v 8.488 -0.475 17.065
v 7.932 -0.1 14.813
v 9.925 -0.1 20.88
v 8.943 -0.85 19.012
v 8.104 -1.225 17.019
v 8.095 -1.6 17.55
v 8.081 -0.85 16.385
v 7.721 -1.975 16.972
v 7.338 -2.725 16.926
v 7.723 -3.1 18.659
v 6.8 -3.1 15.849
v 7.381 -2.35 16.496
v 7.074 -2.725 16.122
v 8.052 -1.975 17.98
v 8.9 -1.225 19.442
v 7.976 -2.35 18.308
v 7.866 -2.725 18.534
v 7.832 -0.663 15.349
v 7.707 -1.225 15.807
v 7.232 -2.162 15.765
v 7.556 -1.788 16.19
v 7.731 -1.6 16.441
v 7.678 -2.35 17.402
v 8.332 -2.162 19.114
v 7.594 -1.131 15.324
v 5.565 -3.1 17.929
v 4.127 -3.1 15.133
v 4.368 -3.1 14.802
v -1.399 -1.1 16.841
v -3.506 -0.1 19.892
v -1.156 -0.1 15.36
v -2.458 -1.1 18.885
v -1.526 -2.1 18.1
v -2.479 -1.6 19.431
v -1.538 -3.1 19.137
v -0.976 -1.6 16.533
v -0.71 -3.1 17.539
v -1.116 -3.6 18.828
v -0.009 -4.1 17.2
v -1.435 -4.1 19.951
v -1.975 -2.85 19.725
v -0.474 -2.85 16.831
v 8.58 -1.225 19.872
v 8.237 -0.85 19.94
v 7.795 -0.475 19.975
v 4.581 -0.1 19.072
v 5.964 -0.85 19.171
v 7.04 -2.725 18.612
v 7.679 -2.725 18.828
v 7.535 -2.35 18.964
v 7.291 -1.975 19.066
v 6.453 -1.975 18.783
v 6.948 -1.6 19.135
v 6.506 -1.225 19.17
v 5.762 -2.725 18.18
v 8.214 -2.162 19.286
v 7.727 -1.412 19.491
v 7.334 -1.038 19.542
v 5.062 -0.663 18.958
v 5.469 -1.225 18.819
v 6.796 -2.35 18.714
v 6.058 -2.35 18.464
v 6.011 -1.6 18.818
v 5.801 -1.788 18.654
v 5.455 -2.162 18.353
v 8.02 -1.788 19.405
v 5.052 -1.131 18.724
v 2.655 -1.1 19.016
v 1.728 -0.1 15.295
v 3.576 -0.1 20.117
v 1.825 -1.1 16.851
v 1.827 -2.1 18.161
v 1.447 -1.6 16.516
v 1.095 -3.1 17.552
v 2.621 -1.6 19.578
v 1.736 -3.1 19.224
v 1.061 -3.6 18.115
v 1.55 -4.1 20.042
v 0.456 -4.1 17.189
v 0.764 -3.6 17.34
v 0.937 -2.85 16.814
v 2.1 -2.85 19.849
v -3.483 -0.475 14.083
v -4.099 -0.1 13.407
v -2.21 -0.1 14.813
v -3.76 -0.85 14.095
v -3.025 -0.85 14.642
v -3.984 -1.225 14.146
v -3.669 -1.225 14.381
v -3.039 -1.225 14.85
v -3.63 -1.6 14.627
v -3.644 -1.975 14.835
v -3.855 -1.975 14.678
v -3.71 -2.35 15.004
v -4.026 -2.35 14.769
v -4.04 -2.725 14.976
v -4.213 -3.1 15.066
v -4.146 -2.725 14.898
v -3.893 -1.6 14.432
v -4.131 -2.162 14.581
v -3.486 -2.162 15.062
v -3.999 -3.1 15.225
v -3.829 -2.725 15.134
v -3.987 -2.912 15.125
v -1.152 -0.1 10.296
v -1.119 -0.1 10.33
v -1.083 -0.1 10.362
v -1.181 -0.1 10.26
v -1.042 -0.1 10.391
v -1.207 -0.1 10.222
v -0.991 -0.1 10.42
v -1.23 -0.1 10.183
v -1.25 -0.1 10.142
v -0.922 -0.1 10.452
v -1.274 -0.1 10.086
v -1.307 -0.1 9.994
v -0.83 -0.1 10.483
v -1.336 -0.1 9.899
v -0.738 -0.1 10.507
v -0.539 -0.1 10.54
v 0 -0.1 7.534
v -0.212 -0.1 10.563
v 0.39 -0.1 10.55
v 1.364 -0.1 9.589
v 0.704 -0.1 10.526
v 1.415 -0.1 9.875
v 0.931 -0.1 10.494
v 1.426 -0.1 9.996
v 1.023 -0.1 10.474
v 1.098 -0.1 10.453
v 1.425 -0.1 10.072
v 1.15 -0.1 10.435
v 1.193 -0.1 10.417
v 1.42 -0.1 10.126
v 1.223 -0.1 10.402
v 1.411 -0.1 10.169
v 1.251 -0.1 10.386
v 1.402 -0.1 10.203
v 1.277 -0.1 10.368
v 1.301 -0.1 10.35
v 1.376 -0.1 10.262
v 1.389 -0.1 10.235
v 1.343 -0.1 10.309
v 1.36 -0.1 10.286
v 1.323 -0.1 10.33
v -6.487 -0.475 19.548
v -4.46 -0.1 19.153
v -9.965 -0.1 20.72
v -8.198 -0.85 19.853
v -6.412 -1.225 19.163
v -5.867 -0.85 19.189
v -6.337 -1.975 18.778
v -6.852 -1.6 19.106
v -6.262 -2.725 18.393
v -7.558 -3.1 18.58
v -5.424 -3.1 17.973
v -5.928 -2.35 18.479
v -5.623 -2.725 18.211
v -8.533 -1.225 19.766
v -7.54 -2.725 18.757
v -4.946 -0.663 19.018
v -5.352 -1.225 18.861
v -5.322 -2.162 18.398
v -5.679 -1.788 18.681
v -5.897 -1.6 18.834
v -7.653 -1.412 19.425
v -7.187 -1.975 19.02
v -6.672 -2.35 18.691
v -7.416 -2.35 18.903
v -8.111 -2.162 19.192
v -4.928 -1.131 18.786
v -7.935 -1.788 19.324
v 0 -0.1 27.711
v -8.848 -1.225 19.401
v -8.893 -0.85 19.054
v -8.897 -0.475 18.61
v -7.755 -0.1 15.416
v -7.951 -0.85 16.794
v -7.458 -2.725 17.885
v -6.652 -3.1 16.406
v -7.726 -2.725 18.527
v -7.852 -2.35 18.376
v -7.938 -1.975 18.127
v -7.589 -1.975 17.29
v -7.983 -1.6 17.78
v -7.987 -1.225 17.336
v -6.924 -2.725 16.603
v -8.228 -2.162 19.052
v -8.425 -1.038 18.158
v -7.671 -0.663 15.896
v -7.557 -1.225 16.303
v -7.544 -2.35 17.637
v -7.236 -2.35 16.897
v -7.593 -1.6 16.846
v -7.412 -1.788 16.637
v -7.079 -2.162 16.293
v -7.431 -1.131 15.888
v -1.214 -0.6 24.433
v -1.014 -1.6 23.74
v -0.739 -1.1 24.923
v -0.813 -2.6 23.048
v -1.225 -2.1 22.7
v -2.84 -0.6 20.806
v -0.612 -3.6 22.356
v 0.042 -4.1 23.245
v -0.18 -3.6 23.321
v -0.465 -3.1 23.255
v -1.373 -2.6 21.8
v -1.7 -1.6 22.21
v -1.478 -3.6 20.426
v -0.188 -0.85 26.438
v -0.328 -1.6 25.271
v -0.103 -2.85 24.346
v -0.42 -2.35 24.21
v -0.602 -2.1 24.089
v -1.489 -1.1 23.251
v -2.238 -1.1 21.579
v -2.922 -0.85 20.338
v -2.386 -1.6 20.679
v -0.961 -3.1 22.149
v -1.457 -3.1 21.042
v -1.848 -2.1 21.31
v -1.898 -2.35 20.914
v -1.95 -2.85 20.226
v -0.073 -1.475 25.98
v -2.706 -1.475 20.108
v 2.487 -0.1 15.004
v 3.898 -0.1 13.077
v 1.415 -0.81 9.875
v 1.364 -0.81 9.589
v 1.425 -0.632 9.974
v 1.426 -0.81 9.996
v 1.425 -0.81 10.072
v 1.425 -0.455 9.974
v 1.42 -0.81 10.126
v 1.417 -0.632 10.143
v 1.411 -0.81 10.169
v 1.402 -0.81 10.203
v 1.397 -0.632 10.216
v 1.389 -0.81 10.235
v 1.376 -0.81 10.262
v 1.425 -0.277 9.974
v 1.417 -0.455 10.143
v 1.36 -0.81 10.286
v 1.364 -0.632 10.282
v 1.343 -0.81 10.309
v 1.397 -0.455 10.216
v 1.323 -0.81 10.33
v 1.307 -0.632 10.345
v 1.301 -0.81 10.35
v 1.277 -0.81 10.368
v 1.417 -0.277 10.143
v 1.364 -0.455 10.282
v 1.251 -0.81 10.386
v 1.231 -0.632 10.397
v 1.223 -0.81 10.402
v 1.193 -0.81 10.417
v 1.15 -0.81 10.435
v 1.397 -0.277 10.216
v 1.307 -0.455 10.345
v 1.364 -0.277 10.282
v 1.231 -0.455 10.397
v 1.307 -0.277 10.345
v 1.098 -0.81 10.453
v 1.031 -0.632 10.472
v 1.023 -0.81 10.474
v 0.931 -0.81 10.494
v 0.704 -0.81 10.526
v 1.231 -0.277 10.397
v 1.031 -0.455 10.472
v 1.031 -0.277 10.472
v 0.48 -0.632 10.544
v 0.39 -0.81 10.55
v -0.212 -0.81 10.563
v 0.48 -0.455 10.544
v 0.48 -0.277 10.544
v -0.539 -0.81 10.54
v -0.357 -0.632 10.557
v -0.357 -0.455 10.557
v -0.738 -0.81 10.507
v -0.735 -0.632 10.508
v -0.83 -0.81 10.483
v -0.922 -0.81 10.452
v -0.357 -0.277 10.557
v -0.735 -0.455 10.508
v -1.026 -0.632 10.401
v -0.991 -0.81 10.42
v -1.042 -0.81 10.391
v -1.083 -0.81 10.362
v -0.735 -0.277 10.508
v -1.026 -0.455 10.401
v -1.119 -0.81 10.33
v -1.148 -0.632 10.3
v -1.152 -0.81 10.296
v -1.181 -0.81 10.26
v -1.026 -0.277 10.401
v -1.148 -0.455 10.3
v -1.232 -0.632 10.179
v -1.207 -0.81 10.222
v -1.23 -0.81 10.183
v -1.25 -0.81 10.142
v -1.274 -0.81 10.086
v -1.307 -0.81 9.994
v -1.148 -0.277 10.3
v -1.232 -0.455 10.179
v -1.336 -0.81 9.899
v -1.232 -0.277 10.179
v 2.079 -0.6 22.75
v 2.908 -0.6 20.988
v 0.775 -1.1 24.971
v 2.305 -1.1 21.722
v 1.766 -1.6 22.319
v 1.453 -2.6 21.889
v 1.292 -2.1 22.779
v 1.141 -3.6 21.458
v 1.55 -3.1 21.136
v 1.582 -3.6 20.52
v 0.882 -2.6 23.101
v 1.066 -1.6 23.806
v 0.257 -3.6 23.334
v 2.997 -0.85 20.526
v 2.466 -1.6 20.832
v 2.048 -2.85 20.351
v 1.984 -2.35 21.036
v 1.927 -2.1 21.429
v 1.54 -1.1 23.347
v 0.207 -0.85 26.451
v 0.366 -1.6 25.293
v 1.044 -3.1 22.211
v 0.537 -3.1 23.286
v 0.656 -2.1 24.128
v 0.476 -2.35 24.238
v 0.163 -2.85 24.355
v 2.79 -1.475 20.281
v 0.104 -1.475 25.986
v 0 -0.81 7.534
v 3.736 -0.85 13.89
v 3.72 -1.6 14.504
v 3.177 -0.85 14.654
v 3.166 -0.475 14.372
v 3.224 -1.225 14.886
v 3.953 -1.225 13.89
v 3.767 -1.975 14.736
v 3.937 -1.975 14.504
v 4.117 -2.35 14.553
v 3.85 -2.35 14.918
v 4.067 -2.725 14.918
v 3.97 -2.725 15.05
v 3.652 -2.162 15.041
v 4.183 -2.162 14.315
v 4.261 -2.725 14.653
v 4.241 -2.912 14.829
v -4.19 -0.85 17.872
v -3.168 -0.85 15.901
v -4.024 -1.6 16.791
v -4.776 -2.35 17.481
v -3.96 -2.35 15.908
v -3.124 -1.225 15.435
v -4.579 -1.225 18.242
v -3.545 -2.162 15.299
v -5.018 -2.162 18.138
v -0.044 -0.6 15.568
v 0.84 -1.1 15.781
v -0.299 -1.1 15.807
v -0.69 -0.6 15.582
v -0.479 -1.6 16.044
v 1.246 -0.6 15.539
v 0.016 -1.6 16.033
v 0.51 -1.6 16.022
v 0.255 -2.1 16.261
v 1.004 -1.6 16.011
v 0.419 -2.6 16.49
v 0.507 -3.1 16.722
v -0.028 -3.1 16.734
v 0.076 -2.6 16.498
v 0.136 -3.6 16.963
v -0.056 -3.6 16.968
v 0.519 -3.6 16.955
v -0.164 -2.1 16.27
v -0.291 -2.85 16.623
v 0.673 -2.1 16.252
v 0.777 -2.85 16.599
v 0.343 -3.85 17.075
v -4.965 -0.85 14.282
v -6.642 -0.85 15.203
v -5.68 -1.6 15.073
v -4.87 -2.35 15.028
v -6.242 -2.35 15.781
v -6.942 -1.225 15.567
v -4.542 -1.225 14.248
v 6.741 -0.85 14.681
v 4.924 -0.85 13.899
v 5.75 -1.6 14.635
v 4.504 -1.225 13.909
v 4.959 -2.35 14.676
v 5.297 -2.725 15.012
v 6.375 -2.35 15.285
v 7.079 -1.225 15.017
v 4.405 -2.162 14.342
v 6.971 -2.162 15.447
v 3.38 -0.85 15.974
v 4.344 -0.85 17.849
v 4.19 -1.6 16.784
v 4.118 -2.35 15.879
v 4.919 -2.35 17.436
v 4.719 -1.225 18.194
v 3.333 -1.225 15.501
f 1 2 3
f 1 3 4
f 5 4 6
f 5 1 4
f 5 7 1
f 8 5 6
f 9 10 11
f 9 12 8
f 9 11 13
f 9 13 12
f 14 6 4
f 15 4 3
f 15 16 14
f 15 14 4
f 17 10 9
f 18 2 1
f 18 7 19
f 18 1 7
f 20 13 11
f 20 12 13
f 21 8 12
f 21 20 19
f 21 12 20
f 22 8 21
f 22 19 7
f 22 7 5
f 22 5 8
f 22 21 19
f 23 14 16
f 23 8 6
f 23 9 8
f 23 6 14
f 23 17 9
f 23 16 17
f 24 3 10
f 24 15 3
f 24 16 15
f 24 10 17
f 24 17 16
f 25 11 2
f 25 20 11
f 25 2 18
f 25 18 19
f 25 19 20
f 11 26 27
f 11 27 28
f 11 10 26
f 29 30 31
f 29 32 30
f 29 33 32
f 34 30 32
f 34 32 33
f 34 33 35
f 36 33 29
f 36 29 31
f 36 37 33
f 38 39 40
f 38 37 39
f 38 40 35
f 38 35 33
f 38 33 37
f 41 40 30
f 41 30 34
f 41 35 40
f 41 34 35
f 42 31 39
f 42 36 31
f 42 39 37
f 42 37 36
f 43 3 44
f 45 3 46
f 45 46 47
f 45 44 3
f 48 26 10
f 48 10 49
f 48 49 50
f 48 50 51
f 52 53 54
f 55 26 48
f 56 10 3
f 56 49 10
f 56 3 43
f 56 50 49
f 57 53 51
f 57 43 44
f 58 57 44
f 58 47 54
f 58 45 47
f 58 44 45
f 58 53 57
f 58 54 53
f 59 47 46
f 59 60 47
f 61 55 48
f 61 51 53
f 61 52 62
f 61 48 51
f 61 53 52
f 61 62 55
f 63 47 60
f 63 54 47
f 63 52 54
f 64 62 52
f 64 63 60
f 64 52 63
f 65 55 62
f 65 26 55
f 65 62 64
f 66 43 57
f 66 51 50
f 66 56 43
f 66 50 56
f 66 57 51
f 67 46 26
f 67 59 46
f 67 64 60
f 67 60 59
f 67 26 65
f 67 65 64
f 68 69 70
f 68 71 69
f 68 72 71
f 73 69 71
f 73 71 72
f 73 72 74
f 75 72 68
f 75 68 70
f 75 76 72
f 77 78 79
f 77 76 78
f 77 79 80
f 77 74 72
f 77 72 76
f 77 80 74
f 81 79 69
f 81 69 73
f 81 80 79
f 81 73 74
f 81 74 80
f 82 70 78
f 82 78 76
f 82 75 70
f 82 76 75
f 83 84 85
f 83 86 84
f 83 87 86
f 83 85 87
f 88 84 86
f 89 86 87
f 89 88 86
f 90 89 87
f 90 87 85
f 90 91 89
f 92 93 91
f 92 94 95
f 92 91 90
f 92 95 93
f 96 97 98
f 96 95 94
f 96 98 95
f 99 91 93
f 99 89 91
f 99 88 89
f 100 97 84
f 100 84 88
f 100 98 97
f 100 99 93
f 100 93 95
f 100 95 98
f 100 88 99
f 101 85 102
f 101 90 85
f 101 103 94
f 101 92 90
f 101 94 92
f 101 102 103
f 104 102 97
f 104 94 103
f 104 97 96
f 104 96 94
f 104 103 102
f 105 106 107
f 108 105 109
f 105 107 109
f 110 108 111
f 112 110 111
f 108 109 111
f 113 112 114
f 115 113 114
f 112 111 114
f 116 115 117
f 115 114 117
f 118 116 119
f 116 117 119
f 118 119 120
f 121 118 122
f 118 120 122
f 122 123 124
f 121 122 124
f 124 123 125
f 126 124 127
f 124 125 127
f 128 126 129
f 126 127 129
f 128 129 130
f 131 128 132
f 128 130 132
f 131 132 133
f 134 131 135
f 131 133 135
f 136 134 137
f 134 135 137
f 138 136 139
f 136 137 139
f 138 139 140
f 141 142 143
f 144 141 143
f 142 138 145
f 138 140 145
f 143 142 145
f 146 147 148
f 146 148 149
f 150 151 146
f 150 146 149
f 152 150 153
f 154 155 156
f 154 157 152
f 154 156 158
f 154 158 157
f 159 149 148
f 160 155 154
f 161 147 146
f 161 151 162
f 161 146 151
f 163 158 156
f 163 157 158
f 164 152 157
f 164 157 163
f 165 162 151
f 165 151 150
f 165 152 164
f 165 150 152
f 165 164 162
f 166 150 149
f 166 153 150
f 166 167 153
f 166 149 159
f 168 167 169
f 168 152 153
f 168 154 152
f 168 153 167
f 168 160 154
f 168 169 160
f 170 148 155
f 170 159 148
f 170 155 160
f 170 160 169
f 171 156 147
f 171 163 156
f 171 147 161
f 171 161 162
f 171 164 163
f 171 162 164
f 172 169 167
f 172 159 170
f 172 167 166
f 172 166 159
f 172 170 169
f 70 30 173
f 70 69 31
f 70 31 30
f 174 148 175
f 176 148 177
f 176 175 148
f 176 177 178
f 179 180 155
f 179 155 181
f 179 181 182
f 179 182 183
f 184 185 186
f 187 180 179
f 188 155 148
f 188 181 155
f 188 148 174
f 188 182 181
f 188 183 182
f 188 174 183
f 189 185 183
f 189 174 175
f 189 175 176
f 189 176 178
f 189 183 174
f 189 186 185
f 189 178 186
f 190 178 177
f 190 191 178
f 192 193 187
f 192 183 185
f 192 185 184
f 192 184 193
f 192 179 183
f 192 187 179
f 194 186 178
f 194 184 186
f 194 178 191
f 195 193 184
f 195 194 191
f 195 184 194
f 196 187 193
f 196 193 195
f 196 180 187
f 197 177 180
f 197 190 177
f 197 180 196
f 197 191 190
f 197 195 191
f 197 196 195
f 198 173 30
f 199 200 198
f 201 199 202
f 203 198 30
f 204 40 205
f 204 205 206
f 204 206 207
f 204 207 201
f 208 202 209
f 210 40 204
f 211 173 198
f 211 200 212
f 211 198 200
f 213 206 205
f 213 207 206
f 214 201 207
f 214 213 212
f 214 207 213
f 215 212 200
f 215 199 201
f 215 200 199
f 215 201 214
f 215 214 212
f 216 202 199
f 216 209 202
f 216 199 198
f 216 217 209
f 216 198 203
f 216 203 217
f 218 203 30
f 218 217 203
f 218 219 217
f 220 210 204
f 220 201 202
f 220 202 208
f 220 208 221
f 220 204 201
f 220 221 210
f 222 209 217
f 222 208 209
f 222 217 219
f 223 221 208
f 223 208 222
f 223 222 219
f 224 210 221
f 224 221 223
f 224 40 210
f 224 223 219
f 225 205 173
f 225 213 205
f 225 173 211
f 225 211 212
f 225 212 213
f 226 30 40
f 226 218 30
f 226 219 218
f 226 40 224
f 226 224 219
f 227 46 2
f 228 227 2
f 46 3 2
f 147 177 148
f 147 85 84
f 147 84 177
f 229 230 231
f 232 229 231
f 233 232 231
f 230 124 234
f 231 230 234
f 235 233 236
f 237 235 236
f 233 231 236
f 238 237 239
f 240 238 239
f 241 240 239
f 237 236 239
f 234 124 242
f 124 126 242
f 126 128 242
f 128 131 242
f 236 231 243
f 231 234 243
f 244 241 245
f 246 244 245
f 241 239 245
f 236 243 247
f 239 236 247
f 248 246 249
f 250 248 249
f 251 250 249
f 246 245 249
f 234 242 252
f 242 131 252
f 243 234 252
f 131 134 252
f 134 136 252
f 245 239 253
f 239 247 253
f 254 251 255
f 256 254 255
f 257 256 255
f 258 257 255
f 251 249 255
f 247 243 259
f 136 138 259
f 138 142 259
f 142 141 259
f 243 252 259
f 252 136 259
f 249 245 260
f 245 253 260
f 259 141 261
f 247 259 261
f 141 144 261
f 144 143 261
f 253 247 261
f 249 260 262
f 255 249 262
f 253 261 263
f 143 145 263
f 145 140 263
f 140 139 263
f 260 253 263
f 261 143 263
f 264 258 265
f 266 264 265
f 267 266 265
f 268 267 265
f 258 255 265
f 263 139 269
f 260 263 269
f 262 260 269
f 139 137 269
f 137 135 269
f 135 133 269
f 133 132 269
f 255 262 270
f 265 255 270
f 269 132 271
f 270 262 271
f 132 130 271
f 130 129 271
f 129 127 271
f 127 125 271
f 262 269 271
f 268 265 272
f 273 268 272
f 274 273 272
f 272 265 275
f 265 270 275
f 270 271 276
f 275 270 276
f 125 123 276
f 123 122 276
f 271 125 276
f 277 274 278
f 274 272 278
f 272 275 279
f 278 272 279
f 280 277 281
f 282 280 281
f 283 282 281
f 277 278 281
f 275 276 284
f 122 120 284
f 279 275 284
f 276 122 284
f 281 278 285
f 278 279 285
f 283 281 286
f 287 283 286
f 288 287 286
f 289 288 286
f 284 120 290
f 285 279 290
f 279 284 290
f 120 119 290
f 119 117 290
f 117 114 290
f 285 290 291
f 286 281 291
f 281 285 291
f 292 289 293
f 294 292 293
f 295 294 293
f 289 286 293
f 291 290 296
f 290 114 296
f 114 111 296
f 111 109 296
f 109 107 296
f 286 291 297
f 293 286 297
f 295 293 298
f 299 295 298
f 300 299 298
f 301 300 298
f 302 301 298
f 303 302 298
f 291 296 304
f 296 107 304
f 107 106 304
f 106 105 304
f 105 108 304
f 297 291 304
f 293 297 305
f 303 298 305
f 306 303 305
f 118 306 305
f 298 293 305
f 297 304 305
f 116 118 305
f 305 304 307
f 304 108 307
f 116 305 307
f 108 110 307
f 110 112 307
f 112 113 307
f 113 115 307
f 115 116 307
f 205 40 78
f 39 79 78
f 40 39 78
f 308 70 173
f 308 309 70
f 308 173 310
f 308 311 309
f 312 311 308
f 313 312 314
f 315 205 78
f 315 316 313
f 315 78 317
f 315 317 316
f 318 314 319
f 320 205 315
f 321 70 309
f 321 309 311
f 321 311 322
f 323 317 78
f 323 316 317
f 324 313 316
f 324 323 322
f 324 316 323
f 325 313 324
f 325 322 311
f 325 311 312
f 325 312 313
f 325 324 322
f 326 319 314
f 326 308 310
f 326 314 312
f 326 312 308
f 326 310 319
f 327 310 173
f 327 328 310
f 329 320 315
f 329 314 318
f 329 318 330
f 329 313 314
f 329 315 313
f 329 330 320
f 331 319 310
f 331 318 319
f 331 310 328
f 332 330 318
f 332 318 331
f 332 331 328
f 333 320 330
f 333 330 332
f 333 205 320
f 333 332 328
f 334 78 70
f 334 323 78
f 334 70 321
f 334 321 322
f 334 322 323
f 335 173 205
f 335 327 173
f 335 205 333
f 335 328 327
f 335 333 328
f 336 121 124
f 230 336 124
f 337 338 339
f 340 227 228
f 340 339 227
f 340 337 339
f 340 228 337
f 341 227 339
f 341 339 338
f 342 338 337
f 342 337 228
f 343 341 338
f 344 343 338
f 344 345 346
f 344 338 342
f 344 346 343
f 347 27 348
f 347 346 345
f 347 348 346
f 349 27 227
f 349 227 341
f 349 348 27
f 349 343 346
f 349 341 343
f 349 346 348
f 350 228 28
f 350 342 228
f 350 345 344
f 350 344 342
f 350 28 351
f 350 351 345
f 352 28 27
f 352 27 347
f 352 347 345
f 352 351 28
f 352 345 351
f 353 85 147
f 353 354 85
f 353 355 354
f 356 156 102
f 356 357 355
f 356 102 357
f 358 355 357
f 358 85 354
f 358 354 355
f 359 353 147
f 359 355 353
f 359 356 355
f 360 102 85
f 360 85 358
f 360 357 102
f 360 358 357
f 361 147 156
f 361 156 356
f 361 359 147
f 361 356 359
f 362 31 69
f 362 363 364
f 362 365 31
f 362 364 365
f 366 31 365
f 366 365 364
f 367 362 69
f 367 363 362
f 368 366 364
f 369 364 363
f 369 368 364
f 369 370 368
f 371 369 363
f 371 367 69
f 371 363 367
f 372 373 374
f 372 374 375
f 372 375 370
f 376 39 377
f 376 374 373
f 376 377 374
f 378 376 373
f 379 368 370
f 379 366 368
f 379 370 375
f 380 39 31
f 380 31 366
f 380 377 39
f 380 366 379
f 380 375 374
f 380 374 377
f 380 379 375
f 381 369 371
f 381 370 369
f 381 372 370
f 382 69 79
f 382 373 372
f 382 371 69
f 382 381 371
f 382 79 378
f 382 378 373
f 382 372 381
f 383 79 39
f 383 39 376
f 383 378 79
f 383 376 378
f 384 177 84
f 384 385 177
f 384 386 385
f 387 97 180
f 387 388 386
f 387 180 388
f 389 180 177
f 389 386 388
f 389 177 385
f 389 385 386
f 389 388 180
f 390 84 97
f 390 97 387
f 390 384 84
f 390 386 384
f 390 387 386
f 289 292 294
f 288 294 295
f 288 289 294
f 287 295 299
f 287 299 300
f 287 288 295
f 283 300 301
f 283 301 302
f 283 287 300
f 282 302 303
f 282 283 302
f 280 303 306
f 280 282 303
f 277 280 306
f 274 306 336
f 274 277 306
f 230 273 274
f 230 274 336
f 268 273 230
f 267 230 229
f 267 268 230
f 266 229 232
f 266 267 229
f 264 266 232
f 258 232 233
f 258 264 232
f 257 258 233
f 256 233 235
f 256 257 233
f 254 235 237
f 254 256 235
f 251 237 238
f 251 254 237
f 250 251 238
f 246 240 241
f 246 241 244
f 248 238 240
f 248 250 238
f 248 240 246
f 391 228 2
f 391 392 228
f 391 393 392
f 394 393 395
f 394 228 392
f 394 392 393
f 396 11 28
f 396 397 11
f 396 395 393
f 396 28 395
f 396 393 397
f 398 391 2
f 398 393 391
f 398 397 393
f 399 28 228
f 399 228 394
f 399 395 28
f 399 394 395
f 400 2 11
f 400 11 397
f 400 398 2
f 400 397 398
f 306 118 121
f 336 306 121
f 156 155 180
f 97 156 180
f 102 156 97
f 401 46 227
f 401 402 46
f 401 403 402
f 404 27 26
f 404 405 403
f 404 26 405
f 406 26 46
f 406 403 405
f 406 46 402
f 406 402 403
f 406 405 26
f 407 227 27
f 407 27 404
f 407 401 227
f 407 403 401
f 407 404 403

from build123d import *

# Parameters (mm, degrees)
F2_DEPTH = 3
F2_TAPER = 25
F3_DEPTH = 4
F3_TAPER = 25
F4_DEPTH = 3
F4_TAPER = 25
F5_DEPTH = 0.71


with BuildPart() as f2:
    # F1 (on offset) → F2 (new body)
    with BuildSketch(Plane.XZ.offset(0.1)):
        Polygon((-7.7553447336, 15.4156507924), (-4.0987459943, 13.4065309539), (-2.2101732902, 14.8129146546), (-4.4603878632, 19.1526152194), (-9.9653769284, 20.7197275013), align=None)
    extrude(amount=F2_DEPTH, taper=F2_TAPER)


with BuildPart() as f3:
    # F1 (on offset) → F3 (new body)
    with BuildSketch(Plane.XZ.offset(0.1)):
        Polygon((-3.5056970365, 19.8917096573), (-1.1557437313, 15.3596557775), (1.7277019797, 15.2951041237), (3.5760921892, 20.1169922948), (0, 27.7114659548), align=None)
    extrude(amount=F3_DEPTH, taper=F3_TAPER)


with BuildPart() as f4:
    # F1 (on offset) → F4 (new body)
    with BuildSketch(Plane.XZ.offset(0.1)):
        Polygon((4.5806518756, 19.0722495317), (2.4873625259, 15.0039009546), (3.8979109377, 13.0769368261), (7.9323425889, 14.8134101182), (9.9249109626, 20.8804570138), align=None)
    extrude(amount=F4_DEPTH, taper=F4_TAPER)


with BuildPart() as f5:
    # F1 (on offset) → F5 (new body)
    with BuildSketch(Plane.XZ.offset(0.1)):
        with BuildLine():
            add(Edge.make_bspline(
                [(1.363565214, 9.5887333155), (1.4177514223, 9.8544390363), (1.5344529232, 10.4266927033), (0.4599871868, 10.5763621916), (-1.1268164757, 10.5922729572), (-1.2781205396, 10.091780729), (-1.3362980681, 9.899337776)],
                knots=[0, 0, 0, 0, 0.2195963883, 0.4729474323, 0.7973444006, 1, 1, 1, 1], degree=3))
            Line((-1.3362980681, 9.899337776), (0, 7.5339702889))
            Line((0, 7.5339702889), (1.363565214, 9.5887333155))
        make_face()
    extrude(amount=F5_DEPTH)


solid = Compound([f2.part, f3.part, f4.part, f5.part])
